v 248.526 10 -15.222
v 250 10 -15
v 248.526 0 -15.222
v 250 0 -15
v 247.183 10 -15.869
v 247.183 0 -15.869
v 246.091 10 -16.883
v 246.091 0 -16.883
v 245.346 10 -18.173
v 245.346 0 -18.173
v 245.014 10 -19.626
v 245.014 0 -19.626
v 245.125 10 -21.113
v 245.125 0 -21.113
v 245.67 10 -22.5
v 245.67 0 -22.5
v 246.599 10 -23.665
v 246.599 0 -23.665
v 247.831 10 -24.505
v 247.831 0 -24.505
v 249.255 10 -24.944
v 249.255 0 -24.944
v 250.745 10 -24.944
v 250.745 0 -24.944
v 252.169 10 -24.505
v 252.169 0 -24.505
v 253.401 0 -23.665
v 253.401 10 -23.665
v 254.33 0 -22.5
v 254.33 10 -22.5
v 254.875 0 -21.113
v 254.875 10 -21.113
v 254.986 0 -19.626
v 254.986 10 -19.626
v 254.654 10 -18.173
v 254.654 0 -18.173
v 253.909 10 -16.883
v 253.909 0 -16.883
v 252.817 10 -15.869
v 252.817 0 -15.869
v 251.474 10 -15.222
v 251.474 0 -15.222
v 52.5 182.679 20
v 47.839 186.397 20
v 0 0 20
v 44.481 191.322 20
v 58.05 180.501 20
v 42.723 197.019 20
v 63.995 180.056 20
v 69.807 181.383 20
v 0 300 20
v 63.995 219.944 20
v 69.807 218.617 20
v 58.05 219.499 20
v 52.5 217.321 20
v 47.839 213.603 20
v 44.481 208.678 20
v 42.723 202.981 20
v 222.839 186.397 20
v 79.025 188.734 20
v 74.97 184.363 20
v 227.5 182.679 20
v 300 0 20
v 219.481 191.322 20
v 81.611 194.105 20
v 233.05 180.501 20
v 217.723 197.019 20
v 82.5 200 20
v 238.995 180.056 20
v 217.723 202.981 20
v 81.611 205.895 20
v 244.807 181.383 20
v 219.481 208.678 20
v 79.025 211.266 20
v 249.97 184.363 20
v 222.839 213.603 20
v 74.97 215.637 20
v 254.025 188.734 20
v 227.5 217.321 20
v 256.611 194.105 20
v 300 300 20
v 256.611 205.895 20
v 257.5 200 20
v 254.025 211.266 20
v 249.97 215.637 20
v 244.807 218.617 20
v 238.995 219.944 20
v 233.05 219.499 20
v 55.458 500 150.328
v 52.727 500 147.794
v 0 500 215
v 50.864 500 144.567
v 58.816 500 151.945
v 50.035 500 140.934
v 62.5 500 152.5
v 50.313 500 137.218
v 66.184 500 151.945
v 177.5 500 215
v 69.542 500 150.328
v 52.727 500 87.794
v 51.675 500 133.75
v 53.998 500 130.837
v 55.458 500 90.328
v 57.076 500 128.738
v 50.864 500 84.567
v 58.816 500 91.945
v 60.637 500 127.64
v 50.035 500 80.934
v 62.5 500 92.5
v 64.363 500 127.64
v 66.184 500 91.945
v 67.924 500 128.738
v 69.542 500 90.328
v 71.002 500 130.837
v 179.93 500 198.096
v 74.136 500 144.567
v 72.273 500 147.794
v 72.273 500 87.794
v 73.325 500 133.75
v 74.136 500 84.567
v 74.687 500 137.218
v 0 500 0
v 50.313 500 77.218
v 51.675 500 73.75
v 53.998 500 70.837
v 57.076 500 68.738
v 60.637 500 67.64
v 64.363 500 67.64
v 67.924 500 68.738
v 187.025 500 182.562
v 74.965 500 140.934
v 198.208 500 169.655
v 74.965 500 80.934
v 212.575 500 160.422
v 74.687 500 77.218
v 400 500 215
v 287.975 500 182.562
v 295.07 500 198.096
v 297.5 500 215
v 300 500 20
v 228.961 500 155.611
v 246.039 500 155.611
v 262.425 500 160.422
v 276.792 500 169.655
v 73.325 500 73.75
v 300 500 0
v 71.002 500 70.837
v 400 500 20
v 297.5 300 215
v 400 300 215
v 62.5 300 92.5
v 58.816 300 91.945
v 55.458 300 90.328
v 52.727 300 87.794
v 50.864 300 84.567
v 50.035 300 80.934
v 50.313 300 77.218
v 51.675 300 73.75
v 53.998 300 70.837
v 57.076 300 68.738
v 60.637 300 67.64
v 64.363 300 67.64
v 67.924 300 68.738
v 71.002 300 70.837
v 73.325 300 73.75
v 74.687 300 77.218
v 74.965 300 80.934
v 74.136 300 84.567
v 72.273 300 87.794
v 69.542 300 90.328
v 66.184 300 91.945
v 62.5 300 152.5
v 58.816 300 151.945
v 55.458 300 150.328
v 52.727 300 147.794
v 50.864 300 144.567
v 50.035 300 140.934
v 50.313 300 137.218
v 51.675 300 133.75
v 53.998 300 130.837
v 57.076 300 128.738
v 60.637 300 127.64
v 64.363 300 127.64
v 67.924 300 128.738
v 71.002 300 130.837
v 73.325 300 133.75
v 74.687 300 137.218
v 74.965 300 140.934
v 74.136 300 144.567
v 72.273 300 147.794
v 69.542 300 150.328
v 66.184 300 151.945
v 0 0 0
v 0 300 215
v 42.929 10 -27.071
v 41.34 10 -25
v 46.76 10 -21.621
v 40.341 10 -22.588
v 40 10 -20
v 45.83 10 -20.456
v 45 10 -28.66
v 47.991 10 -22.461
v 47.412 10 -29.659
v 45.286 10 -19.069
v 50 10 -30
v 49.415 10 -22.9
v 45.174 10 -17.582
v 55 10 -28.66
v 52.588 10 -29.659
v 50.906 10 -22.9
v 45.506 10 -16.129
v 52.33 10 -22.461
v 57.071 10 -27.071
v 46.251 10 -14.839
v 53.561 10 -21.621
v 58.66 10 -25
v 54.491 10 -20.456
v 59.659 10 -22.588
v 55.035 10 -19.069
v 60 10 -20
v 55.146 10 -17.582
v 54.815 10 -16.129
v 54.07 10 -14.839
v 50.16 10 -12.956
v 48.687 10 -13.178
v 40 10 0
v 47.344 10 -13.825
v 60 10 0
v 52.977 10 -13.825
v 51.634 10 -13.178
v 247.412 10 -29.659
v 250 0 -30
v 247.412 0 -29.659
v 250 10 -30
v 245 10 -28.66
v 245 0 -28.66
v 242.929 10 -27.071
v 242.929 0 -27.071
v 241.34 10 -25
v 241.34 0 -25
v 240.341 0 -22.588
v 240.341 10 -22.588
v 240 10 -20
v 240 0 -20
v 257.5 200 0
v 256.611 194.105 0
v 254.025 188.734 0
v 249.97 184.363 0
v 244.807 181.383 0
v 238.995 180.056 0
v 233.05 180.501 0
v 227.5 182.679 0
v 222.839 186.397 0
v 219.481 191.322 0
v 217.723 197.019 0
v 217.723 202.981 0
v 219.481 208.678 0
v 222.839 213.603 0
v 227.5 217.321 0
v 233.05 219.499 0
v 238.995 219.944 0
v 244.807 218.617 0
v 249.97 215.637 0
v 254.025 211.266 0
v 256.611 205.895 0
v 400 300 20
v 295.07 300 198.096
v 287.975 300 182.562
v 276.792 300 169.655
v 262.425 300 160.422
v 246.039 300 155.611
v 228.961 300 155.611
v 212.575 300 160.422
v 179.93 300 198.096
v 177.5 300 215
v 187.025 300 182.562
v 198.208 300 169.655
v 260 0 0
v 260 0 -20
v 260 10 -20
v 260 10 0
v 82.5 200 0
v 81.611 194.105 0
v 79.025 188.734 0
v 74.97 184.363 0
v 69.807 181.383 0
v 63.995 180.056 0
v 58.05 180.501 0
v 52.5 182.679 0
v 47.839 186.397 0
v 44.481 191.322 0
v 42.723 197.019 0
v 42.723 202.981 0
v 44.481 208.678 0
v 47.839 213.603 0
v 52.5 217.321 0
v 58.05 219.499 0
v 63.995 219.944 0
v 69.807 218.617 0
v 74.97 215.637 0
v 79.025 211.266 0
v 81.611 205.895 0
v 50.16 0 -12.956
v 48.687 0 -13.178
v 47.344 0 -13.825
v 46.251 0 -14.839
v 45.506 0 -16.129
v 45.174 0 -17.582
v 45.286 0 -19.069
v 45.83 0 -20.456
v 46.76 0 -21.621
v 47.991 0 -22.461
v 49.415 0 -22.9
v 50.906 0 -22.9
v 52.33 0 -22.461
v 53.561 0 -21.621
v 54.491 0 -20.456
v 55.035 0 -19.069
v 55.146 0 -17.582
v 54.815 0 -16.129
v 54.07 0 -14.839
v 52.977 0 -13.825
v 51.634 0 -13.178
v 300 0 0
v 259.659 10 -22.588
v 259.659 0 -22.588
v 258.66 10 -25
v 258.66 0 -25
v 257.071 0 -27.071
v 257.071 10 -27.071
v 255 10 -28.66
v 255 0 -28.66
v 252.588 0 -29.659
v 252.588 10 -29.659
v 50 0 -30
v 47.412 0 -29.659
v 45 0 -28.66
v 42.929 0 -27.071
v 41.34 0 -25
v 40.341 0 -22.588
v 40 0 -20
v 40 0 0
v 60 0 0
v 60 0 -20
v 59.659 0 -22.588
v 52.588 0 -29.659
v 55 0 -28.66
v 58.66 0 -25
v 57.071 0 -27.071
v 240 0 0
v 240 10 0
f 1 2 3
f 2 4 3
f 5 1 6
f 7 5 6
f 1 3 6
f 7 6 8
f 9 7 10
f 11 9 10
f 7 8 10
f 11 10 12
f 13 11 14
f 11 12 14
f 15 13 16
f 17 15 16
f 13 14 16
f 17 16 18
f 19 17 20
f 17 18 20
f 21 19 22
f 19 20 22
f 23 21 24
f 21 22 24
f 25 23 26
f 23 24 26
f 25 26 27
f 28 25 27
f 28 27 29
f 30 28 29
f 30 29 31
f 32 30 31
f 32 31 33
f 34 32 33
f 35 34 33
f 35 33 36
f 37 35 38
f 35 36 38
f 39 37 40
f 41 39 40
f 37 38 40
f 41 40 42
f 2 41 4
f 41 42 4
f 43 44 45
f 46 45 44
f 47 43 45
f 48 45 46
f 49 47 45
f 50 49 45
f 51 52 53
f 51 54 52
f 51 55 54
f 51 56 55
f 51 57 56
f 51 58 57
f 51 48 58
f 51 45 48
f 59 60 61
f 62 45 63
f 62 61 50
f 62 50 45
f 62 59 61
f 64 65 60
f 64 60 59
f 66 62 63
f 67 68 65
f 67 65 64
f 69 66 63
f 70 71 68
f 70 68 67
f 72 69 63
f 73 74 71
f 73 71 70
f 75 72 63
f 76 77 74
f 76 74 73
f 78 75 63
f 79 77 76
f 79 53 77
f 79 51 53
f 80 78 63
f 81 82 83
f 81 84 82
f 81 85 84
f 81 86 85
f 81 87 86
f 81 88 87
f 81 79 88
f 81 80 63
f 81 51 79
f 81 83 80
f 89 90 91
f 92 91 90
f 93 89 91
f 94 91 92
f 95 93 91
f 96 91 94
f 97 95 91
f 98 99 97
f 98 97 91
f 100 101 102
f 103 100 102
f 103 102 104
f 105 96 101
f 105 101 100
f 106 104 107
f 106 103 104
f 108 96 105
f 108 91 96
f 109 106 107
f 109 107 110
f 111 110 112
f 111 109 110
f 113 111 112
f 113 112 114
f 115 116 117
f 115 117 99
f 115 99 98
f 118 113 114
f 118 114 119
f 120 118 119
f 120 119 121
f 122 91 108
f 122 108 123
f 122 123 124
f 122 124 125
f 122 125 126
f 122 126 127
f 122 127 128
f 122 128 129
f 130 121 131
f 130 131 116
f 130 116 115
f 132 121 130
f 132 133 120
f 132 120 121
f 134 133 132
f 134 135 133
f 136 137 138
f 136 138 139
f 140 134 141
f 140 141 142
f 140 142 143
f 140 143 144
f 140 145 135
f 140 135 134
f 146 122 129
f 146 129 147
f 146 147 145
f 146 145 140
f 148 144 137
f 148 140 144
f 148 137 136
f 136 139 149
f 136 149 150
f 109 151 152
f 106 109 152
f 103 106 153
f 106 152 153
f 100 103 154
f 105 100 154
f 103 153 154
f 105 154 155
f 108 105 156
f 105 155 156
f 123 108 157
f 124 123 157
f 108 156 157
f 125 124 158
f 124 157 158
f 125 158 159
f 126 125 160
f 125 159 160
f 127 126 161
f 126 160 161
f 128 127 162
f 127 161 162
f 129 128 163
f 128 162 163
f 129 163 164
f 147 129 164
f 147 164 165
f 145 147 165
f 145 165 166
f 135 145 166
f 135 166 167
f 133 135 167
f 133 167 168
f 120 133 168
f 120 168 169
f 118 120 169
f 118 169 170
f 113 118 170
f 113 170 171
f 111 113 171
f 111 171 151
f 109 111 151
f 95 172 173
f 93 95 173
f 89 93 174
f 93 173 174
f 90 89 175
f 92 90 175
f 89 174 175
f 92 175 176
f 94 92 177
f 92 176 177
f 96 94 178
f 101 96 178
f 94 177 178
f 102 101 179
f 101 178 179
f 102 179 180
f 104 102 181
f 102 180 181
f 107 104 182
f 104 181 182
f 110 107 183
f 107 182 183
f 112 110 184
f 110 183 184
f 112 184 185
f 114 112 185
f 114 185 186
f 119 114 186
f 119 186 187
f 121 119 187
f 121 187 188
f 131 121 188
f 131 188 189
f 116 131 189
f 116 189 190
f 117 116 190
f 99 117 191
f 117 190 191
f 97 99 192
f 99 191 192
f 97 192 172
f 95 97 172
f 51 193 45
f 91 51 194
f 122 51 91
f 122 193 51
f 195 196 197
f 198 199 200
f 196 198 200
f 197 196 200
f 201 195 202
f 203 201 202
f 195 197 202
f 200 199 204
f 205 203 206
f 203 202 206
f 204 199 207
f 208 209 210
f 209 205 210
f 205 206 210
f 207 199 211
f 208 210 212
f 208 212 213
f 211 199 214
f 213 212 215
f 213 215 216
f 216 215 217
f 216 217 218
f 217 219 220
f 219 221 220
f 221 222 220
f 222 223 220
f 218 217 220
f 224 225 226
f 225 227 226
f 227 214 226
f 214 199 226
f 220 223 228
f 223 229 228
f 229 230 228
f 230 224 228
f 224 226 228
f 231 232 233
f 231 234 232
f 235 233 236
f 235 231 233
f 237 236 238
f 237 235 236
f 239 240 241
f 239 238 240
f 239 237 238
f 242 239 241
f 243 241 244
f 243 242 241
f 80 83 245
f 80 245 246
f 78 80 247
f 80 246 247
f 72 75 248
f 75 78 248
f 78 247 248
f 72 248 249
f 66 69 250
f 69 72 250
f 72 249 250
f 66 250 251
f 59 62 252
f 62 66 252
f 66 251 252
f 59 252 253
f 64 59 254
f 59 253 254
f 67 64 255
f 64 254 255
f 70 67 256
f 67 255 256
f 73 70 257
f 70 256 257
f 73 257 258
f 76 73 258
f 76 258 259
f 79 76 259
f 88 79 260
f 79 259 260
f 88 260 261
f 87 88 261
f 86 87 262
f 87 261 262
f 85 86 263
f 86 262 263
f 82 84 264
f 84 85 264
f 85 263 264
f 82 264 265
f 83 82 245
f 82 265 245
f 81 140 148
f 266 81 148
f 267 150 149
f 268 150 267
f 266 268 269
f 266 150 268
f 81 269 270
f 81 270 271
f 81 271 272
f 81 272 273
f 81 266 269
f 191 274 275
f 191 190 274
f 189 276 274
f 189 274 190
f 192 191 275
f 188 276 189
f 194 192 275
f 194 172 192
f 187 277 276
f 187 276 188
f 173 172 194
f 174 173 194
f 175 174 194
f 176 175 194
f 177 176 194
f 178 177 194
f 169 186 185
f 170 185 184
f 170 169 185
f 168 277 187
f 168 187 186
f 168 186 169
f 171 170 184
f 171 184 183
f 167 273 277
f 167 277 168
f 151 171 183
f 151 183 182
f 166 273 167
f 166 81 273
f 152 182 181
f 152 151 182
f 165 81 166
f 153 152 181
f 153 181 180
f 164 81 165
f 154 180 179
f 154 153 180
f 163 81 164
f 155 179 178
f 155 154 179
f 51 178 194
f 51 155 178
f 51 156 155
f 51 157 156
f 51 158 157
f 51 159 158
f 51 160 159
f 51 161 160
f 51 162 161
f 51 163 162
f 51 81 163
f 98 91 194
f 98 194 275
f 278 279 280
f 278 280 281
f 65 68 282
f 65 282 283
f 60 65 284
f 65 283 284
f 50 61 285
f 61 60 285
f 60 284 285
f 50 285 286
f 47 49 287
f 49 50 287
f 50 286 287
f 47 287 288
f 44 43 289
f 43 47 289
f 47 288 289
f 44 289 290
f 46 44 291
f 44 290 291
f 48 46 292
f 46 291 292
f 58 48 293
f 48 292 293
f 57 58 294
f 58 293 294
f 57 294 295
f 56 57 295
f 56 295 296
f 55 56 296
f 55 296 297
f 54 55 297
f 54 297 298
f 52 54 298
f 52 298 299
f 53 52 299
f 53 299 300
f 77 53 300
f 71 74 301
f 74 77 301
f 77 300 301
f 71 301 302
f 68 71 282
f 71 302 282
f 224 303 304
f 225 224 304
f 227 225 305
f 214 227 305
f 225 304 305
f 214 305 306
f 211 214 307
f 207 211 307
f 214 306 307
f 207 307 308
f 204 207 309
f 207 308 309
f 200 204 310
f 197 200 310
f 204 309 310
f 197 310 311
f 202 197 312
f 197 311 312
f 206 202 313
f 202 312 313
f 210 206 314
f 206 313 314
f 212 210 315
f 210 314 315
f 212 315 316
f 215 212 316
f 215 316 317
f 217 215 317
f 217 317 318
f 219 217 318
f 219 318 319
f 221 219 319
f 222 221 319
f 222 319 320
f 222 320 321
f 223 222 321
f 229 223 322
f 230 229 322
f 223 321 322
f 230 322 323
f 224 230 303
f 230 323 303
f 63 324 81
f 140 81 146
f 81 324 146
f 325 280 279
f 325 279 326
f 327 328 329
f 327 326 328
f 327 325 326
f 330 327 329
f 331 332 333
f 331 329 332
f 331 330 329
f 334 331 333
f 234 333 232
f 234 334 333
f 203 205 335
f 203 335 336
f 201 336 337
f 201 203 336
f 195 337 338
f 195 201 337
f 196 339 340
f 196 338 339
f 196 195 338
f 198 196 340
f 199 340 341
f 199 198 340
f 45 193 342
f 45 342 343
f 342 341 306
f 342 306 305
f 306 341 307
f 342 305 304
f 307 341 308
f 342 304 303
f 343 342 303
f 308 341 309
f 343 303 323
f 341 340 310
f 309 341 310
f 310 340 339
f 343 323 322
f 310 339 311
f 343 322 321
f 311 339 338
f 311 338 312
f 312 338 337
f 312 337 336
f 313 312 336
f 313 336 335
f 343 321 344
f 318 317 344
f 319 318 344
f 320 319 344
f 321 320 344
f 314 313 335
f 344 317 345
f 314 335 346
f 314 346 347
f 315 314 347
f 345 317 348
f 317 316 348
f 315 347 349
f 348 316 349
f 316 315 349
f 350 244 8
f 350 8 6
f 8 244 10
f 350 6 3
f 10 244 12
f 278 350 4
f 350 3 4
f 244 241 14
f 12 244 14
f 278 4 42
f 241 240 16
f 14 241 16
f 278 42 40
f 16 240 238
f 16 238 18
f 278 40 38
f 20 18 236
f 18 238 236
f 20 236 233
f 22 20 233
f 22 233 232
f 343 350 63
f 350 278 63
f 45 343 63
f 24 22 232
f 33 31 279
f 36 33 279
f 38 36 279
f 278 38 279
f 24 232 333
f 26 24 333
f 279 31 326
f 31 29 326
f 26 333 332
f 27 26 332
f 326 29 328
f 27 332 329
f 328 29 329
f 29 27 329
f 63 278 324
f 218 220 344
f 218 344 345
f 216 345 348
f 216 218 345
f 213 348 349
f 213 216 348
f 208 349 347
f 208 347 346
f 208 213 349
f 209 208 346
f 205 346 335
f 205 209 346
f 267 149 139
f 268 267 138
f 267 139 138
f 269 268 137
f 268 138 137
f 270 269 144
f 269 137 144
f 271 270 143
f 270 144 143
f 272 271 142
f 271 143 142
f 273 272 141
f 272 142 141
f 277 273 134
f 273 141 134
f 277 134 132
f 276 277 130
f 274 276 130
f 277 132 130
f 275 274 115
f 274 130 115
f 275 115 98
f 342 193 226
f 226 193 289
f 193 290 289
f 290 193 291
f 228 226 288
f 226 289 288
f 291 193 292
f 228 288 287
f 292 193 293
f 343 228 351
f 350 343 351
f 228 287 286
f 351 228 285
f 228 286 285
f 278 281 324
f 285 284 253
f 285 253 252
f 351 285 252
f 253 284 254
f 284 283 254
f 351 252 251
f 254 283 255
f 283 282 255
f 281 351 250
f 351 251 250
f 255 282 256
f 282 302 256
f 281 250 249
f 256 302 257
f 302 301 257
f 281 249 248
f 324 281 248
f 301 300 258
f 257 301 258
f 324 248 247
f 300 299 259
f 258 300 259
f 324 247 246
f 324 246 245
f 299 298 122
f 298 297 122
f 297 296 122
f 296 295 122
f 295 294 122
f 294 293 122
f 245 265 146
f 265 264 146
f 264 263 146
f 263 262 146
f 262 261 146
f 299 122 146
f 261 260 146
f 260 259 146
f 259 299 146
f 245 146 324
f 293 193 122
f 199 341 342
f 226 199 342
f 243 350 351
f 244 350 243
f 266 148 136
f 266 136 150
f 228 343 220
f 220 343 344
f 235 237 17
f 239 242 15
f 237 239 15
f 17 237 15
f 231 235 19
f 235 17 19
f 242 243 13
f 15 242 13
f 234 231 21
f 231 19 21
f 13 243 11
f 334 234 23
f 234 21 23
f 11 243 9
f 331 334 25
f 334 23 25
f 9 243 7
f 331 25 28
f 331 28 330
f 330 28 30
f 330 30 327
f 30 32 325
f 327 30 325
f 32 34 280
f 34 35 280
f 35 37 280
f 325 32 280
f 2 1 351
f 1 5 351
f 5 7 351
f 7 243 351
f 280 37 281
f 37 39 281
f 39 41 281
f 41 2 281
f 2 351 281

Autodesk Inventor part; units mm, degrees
ref_plane "YZ Plane" through (0, 0, 0) normal (1, 0, 0) x (0, 1, 0)
ref_plane "XZ Plane" through (0, 0, 0) normal (0, 1, 0) x (-1, 0, 0)
ref_plane "XY Plane" through (0, 0, 0) normal (0, 0, 1) x (1, 0, 0)
sketch "草图1" plane through (0, 0, 0) normal (0, 0, 1) x (1, 0, 0)
  line L0 (0, 0) -> (300, 0)
  line L1 (300, 0) -> (300, 500)
  line L2 (300, 500) -> (0, 500)
  line L3 (0, 500) -> (0, 0)
  line L4 (150, 500) -> (150, 0)
  circle A0 centre (62.5, 200) radius 20
  circle A1 centre (237.5, 200) radius 20
  dimension "d0" = 300
  dimension "d1" = 500
  dimension "d2" = 40
  dimension "d3" = 200
  dimension "d4" = 175
extrude "拉伸1" add sketch "草图1" along normal blind 20
sketch "草图2" plane through (0, 0, 20) normal (0, 0, 1) x (1, 0, 0)
  line L0 (300, 500) -> (0, 500) construction
  line L1 (0, 500) -> (0, 0) construction
  line L2 (0, 0) -> (300, 0) construction
  line L3 (300, 0) -> (300, 500) construction
  circle A0 centre (62.5, 200) radius 20 construction
  circle A1 centre (237.5, 200) radius 20 construction
  line L4 (300, 500) -> (0, 500) projected
  line L5 (0, 500) -> (400, 500)
  line L6 (400, 500) -> (400, 300)
  line L7 (400, 300) -> (0, 300)
  line L8 (0, 300) -> (0, 500)
  dimension "d7" = 400
  dimension "d8" = 200
extrude "拉伸2" add sketch "草图2" along normal blind 195
sketch "草图3" plane through (0, 500, 0) normal (0, 1, 0) x (1, 0, 0)
  line L0 (237.5, 53) -> (237.5, -318) projected
  line L1 (300, 0) -> (0, 0) construction
  line L2 (0, 0) -> (0, -215) construction
  line L3 (400, -215) -> (0, -215) construction
  line L4 (400, -20) -> (400, -215) construction
  line L5 (400, -20) -> (300, -20) construction
  line L6 (300, 0) -> (300, -20) construction
  line L7 (0, -215) -> (400, -215) projected
  circle A0 centre (237.5, -215) radius 60
  dimension "d11" = 120
extrude "拉伸3" cut sketch "草图3" against normal through all
sketch "草图4" plane through (0, 500, 0) normal (0, 1, 0) x (1, 0, 0)
  line L0 (62.5, 43) -> (62.5, -258) projected
  arc A0 (297.5, -215) -> (177.5, -215) centre (237.5, -215) ccw construction
  line L1 (0, -215) -> (177.5, -215) construction
  line L2 (0, -20) -> (0, -215) construction
  line L3 (300, -20) -> (0, -20) construction
  line L4 (300, -20) -> (400, -20) construction
  line L5 (400, -20) -> (400, -215) construction
  line L6 (297.5, -215) -> (400, -215) construction
  point P0 (0, 0)
  point P1 (62.5, -80)
  point P2 (62.5, -140)
  dimension "d14" = 60
  dimension "d15" = 60
hole "孔1" at (62.5, 500, 80) at (62.5, 500, 140) direction (0, -1, 0) diameter 25 end through all
sketch "草图5" plane through (0, 0, 0) normal (0, -1, 0) x (1, 0, 0)
  line L0 (0, 0) -> (300, 0) construction
  line L1 (300, 0) -> (300, 20) construction
  line L2 (0, 20) -> (300, 20) construction
  line L3 (0, 0) -> (0, 20) construction
  line L4 (300, 0) -> (0, 0) projected
  line L5 (150, 0) -> (150, 100)
  line L6 (150, 0) -> (250, 0) construction
  line L7 (300, 20) -> (0, 20) construction
  line L8 (40, 20) -> (60, 20)
  line L9 (60, 20) -> (60, -30)
  line L10 (60, -30) -> (40, -30)
  line L11 (40, -30) -> (40, 20)
  line L12 (260, 20) -> (240, 20)
  line L13 (240, 20) -> (240, -30)
  line L14 (240, -30) -> (260, -30)
  line L15 (260, -30) -> (260, 20)
  dimension "d23" = 100
  dimension "d24" = 90
  dimension "d25" = 300
  dimension "d26" = 20
  dimension "d27" = 50
  dimension "d28" = 180
extrude "拉伸4" add sketch "草图5" against normal blind 10
full round fillet "全圆角1" first side at (60, 3.3333, -20) centre faces at (46.6667, 3.3333, -30) second side at (40, 3.3333, -10)
full round fillet "全圆角2" first side at (260, 3.3333, -20) centre faces at (246.6667, 3.3333, -30) second side at (240, 3.3333, -10)
sketch "草图6" plane through (0, 10, 0) normal (0, 1, 0) x (1, 0, 0)
  arc A0 (260, 20) -> (240, 20) centre (250, 20) ccw projected
  point P0 (0, 0)
  point P1 (50.1604, 17.9561)
hole "孔2" at (50.1604, 10, -17.9561) at (250, 10, -20) direction (0, -1, 0) diameter 10 end through all
properties part number "主体"
